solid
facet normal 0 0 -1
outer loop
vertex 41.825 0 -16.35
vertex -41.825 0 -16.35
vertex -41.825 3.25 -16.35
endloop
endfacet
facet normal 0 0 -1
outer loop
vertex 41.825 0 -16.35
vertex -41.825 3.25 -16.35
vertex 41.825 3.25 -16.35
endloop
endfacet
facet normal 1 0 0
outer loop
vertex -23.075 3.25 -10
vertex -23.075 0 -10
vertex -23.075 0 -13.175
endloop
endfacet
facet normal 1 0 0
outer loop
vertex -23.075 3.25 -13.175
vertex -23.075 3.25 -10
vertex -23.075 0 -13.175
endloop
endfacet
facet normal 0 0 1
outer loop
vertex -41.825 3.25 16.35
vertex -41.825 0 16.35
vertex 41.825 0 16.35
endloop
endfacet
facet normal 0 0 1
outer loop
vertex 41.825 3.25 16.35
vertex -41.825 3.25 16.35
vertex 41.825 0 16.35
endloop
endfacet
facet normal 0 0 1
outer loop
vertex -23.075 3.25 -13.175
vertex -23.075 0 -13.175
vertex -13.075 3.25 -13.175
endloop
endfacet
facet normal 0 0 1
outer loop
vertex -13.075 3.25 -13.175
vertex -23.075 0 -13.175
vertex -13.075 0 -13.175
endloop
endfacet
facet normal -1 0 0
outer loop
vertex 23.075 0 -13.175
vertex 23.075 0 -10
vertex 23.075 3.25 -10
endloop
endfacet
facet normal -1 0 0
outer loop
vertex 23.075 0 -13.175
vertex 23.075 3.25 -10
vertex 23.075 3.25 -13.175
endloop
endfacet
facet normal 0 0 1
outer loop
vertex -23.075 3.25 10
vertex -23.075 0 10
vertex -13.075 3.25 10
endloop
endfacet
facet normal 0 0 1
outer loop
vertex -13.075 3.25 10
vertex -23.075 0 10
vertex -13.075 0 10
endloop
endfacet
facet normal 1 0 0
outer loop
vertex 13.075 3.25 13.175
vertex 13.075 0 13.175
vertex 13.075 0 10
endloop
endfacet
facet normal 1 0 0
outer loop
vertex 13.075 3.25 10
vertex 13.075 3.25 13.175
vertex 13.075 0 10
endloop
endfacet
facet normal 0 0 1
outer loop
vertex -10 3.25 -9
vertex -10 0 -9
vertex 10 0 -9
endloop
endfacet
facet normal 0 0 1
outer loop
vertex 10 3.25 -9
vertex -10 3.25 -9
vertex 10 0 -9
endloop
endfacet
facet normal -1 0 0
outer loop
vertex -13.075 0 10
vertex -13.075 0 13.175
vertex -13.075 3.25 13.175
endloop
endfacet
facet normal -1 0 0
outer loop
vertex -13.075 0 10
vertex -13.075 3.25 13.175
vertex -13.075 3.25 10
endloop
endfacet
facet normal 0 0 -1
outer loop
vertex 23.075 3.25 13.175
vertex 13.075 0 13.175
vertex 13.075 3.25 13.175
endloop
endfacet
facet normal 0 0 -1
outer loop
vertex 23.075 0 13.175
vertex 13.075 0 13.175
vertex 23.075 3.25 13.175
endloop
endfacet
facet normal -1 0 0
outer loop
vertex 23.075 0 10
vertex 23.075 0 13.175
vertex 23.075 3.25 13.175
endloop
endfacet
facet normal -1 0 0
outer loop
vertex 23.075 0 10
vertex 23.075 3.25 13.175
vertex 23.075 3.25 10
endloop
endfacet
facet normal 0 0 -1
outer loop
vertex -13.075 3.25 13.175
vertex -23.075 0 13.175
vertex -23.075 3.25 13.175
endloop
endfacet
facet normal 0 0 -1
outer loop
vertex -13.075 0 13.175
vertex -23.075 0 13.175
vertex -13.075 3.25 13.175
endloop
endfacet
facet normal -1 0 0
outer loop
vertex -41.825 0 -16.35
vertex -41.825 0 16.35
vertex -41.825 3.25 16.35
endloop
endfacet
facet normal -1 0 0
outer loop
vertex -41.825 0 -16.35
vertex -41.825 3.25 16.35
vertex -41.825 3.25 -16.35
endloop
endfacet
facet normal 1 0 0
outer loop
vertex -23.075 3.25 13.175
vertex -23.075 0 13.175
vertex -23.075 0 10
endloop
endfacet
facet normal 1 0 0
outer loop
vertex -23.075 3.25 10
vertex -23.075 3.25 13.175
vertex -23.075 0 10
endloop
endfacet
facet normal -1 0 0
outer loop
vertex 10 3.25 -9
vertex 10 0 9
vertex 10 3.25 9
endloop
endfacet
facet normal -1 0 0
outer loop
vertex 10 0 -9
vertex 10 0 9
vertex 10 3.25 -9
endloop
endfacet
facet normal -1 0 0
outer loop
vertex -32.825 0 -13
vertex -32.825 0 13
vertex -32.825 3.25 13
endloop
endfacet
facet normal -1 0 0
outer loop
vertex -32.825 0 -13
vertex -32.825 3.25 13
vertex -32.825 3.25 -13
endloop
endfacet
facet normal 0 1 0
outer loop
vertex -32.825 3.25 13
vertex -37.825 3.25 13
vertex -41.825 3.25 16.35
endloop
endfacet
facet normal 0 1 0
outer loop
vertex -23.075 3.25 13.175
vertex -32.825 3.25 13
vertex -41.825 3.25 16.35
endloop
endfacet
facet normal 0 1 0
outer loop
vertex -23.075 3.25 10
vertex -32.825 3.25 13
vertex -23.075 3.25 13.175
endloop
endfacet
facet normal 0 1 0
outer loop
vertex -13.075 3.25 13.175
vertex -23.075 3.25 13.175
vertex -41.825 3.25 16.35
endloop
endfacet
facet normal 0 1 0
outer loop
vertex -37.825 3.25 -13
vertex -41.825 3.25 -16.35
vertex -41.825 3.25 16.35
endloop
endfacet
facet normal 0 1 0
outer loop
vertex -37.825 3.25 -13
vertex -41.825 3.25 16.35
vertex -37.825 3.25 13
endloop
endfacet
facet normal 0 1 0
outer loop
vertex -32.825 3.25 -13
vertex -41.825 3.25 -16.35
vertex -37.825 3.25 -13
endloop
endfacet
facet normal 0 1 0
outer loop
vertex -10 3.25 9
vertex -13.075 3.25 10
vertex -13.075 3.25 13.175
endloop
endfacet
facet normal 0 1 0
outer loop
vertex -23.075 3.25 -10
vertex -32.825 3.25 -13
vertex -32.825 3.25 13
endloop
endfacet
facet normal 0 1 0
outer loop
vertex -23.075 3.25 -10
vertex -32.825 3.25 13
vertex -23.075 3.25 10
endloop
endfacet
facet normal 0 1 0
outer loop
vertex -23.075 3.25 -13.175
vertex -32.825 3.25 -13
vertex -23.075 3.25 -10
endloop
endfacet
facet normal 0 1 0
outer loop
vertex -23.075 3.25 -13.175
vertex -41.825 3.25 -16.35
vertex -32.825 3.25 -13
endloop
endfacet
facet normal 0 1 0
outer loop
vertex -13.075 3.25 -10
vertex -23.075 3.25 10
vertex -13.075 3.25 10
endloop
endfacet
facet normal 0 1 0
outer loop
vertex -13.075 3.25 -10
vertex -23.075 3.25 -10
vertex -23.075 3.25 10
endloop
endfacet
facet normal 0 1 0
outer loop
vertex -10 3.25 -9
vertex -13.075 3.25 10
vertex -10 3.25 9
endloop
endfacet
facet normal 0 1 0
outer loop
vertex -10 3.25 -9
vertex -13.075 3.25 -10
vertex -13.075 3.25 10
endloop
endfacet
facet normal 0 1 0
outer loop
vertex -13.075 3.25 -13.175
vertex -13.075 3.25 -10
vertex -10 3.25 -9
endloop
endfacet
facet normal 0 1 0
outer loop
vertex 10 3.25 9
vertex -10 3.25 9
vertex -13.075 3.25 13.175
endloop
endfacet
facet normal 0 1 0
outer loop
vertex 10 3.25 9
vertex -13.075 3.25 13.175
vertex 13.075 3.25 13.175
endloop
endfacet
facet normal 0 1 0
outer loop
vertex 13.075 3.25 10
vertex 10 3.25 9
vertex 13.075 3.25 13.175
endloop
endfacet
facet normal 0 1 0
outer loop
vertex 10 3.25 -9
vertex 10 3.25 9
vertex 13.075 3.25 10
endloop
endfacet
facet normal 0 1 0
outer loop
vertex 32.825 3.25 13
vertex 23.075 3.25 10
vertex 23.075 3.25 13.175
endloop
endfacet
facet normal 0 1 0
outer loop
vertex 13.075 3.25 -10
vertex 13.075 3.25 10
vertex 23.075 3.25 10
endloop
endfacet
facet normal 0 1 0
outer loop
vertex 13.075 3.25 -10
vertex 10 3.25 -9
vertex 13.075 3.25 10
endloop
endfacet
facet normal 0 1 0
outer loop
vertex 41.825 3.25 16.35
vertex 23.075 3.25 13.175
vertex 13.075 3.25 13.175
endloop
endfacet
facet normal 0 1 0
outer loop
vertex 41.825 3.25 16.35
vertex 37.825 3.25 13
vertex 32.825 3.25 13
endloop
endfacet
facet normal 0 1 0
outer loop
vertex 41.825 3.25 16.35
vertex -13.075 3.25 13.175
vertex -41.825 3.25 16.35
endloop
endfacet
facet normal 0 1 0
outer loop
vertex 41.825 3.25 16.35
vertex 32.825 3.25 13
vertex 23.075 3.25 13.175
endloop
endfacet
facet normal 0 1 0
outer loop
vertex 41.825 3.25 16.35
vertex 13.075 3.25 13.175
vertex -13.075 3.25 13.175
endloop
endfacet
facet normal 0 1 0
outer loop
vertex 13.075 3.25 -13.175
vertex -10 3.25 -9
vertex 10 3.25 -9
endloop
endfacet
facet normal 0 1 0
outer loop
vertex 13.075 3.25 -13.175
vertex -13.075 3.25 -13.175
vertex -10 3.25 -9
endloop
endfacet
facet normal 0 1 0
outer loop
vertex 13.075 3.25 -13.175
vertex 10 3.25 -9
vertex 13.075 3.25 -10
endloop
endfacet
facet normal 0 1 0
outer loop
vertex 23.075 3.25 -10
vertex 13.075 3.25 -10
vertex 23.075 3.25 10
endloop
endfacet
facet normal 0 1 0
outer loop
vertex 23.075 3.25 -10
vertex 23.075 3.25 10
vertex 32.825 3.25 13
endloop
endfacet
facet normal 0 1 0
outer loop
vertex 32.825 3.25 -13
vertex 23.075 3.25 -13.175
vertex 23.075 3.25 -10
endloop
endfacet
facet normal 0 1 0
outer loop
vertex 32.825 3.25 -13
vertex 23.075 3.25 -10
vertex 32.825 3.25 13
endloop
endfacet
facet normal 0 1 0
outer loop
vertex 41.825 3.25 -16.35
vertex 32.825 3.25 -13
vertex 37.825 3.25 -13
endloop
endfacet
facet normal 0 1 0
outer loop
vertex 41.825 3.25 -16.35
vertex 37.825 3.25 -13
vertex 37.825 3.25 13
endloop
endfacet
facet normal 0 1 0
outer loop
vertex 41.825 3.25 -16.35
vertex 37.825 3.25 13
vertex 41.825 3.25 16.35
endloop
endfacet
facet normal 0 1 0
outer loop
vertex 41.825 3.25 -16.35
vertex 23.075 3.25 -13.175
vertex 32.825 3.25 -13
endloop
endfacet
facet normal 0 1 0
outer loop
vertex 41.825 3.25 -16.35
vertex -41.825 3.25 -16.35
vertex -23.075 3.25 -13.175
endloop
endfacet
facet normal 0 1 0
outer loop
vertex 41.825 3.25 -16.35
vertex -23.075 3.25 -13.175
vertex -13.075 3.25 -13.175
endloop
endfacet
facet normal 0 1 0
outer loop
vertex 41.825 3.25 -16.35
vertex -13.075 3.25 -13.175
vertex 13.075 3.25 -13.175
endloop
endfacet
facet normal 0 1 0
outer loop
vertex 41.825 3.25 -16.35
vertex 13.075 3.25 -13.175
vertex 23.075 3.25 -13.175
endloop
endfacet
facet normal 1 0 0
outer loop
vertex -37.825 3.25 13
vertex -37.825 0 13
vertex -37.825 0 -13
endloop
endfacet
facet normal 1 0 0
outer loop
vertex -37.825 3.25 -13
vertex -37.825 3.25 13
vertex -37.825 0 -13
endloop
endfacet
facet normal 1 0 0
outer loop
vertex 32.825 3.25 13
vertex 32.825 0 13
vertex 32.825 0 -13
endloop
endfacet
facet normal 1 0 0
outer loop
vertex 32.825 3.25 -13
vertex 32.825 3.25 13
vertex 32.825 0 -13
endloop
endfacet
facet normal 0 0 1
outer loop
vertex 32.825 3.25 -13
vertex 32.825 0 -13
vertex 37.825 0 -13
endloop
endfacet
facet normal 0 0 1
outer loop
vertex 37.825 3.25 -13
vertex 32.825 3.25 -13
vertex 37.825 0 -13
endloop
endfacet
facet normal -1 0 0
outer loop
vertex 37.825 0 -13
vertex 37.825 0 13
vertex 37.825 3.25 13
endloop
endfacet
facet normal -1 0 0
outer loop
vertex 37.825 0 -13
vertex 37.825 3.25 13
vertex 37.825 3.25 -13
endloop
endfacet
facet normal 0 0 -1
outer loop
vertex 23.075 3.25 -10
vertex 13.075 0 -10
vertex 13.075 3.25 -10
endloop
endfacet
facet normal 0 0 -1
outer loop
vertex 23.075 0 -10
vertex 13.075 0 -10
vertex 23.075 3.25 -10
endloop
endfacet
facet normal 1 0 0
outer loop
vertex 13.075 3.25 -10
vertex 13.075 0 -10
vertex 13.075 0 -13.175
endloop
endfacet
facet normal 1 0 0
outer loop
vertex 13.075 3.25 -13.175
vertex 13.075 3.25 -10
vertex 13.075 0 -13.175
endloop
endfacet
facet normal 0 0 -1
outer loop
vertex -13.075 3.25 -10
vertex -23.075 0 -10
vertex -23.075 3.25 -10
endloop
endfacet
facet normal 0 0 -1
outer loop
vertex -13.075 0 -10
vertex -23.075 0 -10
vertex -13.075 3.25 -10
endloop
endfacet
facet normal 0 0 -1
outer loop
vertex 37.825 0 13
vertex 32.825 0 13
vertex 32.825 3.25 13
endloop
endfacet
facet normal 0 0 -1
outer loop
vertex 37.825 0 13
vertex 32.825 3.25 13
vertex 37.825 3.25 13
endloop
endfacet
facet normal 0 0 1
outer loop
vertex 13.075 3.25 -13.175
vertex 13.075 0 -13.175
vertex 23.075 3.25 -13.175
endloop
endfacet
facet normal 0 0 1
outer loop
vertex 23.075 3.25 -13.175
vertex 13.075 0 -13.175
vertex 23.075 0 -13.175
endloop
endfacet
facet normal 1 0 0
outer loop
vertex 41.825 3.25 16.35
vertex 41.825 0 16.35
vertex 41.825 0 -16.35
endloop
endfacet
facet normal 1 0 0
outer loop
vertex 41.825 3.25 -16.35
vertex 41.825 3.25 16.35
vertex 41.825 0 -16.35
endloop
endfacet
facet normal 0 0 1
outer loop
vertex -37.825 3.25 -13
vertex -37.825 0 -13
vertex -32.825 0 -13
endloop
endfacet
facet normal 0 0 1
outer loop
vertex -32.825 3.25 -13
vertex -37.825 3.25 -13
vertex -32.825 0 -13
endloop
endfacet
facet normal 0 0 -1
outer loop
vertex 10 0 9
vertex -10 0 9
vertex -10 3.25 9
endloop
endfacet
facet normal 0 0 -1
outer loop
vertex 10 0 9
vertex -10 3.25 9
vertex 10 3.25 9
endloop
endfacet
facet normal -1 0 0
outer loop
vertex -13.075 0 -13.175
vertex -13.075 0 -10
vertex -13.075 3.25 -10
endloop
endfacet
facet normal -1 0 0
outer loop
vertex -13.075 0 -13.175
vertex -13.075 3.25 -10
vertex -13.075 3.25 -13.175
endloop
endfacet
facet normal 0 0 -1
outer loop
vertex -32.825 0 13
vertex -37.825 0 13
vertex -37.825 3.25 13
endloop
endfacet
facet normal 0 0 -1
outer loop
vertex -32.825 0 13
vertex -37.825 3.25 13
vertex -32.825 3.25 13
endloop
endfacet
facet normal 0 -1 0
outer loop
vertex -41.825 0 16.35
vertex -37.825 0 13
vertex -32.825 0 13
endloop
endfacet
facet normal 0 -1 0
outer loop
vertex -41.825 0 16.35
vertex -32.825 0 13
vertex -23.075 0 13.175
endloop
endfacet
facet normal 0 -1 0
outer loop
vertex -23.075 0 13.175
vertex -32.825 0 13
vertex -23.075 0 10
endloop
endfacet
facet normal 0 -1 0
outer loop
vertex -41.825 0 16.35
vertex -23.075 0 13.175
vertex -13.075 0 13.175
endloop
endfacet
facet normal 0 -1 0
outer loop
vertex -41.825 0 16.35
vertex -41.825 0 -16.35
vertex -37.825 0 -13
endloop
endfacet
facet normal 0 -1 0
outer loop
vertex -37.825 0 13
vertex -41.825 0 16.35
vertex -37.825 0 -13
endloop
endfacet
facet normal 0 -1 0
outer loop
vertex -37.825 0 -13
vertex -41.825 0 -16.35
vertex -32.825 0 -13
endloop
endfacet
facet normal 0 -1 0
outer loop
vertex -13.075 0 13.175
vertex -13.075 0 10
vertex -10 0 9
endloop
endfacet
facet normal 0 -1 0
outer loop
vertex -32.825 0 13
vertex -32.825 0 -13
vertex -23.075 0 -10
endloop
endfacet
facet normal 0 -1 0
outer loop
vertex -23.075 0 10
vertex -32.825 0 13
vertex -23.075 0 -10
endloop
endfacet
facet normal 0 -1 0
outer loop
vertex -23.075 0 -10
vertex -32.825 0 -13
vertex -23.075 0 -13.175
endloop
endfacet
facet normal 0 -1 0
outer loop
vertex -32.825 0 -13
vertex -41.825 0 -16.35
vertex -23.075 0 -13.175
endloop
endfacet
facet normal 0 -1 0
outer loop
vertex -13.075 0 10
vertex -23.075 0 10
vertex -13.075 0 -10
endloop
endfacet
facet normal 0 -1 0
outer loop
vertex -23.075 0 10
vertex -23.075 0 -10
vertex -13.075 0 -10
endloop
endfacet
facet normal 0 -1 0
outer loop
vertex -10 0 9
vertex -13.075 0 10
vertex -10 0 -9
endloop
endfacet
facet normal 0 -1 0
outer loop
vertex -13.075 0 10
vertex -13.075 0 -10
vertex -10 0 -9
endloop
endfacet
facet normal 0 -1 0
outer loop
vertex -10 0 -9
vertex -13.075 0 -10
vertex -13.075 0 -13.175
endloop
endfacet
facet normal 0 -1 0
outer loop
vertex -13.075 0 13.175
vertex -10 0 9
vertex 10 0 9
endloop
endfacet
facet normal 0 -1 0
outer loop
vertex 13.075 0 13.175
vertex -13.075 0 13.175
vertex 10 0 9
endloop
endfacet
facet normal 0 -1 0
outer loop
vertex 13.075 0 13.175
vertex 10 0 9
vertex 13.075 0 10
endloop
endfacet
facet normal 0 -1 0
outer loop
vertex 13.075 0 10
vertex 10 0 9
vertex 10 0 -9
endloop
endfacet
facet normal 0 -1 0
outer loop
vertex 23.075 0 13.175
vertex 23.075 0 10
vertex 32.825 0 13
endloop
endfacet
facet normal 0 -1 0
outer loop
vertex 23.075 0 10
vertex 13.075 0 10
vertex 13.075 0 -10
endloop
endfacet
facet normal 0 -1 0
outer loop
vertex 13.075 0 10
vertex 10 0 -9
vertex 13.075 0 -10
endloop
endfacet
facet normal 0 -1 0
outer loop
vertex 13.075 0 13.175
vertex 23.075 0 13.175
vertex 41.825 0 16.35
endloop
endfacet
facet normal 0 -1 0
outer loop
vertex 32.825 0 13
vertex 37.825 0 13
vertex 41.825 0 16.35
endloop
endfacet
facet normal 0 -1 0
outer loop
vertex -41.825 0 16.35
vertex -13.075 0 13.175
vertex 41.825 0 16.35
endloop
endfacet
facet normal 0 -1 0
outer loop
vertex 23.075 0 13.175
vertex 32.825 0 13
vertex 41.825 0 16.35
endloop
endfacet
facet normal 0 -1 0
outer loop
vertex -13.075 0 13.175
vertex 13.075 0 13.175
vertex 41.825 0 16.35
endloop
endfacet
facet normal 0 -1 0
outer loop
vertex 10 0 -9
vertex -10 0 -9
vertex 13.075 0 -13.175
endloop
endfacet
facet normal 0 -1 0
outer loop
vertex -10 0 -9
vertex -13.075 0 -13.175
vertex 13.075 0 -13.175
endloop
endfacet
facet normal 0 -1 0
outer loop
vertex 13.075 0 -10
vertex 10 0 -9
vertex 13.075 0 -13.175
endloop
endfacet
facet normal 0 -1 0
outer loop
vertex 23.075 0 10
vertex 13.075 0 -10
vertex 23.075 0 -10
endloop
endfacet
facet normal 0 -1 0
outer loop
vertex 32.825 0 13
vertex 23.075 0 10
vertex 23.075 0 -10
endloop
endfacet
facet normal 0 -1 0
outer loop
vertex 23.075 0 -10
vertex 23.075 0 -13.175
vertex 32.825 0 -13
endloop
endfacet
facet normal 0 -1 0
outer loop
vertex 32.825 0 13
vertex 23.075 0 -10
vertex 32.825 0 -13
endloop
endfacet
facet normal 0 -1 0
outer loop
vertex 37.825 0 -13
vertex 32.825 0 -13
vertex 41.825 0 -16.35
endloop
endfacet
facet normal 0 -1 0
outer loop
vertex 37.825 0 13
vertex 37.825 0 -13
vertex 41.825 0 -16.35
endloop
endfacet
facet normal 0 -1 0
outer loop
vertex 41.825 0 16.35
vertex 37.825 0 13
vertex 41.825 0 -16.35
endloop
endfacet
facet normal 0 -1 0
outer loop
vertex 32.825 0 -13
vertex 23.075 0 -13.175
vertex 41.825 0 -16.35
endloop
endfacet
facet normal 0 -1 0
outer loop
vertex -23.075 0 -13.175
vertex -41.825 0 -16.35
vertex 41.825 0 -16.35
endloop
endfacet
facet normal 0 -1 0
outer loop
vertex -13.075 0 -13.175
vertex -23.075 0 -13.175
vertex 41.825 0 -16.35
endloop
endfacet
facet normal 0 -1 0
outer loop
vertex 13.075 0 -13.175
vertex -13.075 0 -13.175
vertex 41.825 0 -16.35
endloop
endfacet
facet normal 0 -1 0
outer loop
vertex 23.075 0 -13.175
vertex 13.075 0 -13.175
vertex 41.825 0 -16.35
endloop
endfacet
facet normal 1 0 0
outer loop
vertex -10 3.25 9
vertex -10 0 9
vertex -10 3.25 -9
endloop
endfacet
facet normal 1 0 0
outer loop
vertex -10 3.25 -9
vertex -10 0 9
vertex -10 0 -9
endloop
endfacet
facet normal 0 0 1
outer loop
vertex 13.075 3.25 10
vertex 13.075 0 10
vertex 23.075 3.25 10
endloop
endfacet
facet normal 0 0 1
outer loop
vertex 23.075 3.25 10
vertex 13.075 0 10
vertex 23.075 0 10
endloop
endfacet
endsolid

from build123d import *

# Parameters (mm, degrees)
SKETCH1_W           = 83.65
SKETCH1_H           = 32.7
SKETCH1_W_2         = 5
SKETCH1_H_2         = 26
SKETCH1_W_3         = 10
SKETCH1_H_3         = 3.175
SKETCH1_W_4         = 20
SKETCH1_H_4         = 18
BOSS_EXTRUDE1_DEPTH = 3.25


with BuildPart() as part:
    # Sketch1 → Boss-Extrude1 (new body)
    with BuildSketch(Plane(origin=(0, 0, 0), x_dir=(1, 0, 0), z_dir=(0, 1, 0))):
        Rectangle(SKETCH1_W, SKETCH1_H)
        with Locations((-35.325, 0)):
            Rectangle(SKETCH1_W_2, SKETCH1_H_2, mode=Mode.SUBTRACT)
        with Locations((-18.075, 11.5875)):
            Rectangle(SKETCH1_W_3, SKETCH1_H_3, mode=Mode.SUBTRACT)
        with Locations((35.325, 0)):
            Rectangle(SKETCH1_W_2, SKETCH1_H_2, mode=Mode.SUBTRACT)
        with Locations((18.075, 11.5875)):
            Rectangle(SKETCH1_W_3, SKETCH1_H_3, mode=Mode.SUBTRACT)
        with Locations((18.075, -11.5875)):
            Rectangle(SKETCH1_W_3, SKETCH1_H_3, mode=Mode.SUBTRACT)
        with Locations((-18.075, -11.5875)):
            Rectangle(SKETCH1_W_3, SKETCH1_H_3, mode=Mode.SUBTRACT)
        Rectangle(SKETCH1_W_4, SKETCH1_H_4, mode=Mode.SUBTRACT)
    extrude(amount=BOSS_EXTRUDE1_DEPTH)


solid = part.part
